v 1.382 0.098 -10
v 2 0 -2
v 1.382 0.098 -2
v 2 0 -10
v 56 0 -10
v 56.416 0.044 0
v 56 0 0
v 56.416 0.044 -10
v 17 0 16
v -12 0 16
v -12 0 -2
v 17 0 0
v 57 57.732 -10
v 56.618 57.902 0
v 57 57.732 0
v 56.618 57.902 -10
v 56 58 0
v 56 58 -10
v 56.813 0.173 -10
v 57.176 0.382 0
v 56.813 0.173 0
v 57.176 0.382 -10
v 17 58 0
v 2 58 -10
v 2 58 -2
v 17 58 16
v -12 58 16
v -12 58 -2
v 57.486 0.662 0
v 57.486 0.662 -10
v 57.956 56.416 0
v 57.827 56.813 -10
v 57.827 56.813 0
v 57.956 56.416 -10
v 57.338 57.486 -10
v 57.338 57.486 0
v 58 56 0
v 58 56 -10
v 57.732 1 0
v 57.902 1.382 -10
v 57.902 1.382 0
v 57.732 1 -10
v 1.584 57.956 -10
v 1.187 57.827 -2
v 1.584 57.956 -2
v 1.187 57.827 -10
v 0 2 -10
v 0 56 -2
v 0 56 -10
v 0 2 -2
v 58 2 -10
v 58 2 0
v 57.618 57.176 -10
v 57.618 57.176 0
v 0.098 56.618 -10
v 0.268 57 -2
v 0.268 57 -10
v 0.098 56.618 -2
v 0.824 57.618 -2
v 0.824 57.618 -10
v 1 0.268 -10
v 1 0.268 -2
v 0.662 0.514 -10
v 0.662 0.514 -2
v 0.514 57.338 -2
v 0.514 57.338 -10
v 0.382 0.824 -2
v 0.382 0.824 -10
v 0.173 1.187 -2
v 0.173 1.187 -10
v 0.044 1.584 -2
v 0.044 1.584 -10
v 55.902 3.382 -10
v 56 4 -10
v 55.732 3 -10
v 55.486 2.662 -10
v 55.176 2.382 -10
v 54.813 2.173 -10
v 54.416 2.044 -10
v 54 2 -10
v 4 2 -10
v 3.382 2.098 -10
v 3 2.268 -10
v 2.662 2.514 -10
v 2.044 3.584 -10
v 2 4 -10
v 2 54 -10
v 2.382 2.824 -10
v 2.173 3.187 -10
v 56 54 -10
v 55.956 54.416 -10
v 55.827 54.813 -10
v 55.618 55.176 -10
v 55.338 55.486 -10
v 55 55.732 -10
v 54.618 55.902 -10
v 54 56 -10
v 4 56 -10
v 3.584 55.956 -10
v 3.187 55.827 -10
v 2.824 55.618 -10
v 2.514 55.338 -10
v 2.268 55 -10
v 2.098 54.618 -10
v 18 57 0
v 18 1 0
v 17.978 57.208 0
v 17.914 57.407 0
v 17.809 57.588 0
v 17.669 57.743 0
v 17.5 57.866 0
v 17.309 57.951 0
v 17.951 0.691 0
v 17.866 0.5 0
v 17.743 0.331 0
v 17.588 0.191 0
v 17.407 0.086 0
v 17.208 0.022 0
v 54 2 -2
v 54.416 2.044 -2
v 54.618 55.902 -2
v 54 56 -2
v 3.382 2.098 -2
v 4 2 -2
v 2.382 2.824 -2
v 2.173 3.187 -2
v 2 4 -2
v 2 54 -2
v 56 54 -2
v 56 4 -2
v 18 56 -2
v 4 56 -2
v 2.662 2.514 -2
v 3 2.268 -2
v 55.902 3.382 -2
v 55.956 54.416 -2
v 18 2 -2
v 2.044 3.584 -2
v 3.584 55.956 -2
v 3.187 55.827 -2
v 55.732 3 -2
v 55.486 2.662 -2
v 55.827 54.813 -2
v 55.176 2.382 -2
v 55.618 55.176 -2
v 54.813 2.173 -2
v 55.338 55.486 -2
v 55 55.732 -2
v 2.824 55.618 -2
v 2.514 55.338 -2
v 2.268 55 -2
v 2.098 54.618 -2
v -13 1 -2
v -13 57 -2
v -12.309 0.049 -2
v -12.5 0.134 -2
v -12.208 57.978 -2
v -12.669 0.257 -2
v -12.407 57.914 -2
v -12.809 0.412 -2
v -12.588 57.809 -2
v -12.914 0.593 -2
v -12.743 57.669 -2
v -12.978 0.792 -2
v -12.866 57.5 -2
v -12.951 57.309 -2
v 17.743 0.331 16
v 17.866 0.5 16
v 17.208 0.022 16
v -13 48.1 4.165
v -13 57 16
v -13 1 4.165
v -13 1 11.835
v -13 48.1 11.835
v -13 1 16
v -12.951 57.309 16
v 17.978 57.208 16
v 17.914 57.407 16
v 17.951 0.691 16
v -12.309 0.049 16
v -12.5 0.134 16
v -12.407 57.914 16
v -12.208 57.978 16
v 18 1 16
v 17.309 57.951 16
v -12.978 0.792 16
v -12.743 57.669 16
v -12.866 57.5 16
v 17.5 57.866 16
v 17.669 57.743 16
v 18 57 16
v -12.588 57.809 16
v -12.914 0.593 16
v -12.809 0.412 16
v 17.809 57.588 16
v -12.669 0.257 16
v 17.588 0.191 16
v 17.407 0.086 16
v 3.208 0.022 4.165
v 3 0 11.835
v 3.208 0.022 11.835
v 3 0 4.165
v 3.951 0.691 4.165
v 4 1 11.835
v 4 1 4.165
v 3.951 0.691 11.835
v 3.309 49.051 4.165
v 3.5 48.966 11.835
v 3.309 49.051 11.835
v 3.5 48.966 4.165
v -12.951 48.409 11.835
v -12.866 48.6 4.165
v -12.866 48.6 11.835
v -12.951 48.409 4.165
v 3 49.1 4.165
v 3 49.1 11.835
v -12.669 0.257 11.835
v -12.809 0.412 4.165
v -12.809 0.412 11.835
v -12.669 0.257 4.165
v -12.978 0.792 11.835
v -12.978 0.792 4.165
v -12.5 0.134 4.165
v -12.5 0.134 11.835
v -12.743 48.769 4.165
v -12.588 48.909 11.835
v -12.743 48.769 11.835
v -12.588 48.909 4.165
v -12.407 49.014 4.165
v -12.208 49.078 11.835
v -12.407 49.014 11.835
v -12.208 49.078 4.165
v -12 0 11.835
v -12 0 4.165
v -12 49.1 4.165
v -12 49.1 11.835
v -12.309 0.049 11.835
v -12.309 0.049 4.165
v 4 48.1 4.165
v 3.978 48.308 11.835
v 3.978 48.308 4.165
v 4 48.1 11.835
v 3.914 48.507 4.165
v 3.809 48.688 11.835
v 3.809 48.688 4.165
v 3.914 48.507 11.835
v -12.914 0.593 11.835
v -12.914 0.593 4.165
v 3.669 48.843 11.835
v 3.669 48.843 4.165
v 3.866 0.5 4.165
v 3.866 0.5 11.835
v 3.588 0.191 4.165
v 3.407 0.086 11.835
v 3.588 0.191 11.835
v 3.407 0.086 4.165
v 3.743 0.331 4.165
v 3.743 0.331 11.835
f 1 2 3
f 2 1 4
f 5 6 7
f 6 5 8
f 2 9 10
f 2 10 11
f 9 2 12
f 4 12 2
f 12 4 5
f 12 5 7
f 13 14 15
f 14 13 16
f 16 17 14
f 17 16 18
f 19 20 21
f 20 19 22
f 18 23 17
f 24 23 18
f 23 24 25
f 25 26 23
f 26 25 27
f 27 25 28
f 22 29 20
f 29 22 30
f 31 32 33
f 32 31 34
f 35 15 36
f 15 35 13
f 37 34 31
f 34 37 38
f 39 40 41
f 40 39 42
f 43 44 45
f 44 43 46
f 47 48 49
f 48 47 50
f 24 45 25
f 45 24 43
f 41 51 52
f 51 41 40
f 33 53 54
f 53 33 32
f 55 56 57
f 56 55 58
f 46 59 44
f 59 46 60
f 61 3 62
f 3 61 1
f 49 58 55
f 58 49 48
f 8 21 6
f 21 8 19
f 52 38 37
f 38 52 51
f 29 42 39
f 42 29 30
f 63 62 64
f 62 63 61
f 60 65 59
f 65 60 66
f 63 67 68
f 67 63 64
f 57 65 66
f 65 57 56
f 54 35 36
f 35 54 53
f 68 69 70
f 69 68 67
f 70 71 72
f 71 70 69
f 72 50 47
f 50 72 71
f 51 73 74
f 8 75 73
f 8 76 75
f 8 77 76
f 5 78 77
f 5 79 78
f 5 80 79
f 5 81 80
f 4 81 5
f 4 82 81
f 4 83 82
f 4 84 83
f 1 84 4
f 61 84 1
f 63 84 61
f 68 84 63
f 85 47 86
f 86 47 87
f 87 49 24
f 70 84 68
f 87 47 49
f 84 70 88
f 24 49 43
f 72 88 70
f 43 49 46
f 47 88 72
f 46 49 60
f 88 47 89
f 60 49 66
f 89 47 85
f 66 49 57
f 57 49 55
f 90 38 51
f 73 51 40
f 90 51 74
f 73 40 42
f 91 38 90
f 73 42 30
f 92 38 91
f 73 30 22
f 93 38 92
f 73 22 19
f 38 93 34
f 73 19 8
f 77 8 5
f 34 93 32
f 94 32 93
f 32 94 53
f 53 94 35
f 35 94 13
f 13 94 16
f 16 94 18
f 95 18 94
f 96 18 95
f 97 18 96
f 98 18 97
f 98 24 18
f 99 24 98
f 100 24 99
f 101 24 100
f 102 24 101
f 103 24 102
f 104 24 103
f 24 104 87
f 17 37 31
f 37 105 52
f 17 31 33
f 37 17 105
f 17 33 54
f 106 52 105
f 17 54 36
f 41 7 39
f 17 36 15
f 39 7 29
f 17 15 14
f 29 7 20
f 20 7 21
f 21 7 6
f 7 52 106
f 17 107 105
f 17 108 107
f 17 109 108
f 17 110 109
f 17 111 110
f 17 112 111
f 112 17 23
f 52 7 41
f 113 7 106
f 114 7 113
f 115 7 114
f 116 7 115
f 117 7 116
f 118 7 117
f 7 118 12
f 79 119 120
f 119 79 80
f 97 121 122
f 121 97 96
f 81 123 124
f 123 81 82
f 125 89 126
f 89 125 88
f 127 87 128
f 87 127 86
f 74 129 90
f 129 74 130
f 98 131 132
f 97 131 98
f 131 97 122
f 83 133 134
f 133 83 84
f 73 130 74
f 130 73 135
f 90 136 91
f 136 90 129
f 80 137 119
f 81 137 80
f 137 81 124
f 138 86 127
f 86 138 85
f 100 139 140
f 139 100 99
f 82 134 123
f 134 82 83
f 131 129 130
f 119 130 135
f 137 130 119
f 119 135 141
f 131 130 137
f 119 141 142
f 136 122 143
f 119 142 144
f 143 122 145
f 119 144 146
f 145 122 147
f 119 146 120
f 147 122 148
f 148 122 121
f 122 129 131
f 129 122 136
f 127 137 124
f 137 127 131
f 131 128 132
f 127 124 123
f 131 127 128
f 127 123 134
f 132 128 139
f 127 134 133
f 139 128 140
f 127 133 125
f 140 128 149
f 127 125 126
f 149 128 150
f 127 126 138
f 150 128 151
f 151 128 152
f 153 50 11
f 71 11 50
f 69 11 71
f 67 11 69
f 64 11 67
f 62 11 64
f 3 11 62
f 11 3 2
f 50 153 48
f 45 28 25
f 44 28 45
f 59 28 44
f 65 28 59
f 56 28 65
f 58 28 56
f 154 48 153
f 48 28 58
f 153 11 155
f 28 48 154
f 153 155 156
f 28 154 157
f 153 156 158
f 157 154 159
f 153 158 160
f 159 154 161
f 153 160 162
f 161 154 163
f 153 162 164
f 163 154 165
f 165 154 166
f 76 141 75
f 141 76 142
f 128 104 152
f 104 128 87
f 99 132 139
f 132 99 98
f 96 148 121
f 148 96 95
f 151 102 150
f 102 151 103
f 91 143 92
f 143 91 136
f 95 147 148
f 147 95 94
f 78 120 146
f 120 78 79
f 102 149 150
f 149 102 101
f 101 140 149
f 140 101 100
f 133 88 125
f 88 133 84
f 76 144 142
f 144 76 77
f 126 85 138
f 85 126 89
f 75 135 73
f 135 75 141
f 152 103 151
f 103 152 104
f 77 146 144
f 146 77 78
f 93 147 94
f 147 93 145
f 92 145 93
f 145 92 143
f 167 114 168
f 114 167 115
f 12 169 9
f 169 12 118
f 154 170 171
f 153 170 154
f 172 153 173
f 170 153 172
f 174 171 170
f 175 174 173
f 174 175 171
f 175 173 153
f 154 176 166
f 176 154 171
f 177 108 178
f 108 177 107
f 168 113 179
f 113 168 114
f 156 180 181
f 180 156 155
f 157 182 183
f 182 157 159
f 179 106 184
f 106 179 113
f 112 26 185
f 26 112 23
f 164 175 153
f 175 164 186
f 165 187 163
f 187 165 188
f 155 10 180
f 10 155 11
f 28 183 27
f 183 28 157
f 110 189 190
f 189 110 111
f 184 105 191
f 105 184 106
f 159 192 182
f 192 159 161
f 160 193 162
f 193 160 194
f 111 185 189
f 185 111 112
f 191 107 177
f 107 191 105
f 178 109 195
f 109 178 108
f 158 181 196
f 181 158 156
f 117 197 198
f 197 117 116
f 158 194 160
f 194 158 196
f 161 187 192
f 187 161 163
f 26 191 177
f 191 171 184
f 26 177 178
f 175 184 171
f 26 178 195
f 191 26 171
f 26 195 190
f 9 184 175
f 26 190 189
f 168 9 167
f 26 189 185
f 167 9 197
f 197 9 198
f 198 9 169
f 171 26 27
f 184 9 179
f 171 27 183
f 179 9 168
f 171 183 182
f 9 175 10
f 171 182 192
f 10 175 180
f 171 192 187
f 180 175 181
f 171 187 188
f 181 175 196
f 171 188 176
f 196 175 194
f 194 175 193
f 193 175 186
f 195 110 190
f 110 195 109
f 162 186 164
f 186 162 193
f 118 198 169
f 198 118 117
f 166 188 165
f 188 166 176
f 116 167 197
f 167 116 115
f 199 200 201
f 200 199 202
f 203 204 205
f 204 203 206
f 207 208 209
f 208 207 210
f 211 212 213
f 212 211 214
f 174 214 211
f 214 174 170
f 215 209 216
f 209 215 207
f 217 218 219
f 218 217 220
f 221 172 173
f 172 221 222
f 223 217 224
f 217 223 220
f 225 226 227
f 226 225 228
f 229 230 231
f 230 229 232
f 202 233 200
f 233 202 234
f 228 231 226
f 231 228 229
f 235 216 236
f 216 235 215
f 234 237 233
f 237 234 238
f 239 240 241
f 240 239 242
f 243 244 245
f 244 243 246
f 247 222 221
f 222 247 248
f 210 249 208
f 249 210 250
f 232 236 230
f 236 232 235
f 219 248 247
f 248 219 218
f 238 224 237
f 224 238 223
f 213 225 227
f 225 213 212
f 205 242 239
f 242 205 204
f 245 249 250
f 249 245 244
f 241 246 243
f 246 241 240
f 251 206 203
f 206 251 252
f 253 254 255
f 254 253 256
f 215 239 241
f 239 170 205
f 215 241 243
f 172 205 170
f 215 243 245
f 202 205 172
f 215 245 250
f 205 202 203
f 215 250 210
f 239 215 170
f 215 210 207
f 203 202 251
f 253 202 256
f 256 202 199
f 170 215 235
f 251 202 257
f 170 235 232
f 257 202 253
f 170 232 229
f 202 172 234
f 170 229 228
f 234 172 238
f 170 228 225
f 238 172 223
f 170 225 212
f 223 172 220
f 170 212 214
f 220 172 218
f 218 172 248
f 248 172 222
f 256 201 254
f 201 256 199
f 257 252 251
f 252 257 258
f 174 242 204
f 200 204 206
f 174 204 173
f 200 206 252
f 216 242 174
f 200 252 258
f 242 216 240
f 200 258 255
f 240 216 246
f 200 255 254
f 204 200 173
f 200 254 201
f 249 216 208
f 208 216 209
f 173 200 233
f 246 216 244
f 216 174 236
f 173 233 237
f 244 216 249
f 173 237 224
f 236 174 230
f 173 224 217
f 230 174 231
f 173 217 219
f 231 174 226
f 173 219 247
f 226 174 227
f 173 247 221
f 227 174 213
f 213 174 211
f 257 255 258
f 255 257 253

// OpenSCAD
//use <otherPeoplesWork/threads-scad/threads.scad>
use <myTools.scad>

M5_is_leftsided  = true;
laptop_frame_horiz = 13;
laptop_frame_depth = 5.67;
laptop_frame_vert = 45.1;

/* [Hidden] */

punch = $preview ? 2: 0;

x = 54;   // M5 
y = x;      // M5
z = 8;      // covers some connectors.

$fn=60;   //circle quantize 360/10=36 degrees per side

wall = +2;

// container for the M5
M5_outside = [ x, y, z];
M5_middle = [ x/2, y/2, z/2];

// part that chomps the laptop
pacman = [ x/2, y, 16];
pacman_mouth = [ laptop_frame_horiz, laptop_frame_vert, laptop_frame_depth];

module build_M5()
{
    // container for the M5
    abox( M5_outside, thick = +2, round_out=2, round_in=2, bCentered = false);

    // make the pacman
    translate([-laptop_frame_horiz, 0, -pacman.z])
    difference()
    {
        abox( pacman, thick = +2, round_out=1, bSolid=true, bCentered = false);
        translate([pacman_mouth.x/2 + wall , pacman_mouth.y/2 + wall, pacman.z/2])
        #abox( pacman_mouth, thick = +2, bSolid = true, round_out=1, bCentered = true);
    }    
 }

if (M5_is_leftsided)
{
    mirror([ 0, 0, 1])
    build_M5();
}    
else
    build_M5();
